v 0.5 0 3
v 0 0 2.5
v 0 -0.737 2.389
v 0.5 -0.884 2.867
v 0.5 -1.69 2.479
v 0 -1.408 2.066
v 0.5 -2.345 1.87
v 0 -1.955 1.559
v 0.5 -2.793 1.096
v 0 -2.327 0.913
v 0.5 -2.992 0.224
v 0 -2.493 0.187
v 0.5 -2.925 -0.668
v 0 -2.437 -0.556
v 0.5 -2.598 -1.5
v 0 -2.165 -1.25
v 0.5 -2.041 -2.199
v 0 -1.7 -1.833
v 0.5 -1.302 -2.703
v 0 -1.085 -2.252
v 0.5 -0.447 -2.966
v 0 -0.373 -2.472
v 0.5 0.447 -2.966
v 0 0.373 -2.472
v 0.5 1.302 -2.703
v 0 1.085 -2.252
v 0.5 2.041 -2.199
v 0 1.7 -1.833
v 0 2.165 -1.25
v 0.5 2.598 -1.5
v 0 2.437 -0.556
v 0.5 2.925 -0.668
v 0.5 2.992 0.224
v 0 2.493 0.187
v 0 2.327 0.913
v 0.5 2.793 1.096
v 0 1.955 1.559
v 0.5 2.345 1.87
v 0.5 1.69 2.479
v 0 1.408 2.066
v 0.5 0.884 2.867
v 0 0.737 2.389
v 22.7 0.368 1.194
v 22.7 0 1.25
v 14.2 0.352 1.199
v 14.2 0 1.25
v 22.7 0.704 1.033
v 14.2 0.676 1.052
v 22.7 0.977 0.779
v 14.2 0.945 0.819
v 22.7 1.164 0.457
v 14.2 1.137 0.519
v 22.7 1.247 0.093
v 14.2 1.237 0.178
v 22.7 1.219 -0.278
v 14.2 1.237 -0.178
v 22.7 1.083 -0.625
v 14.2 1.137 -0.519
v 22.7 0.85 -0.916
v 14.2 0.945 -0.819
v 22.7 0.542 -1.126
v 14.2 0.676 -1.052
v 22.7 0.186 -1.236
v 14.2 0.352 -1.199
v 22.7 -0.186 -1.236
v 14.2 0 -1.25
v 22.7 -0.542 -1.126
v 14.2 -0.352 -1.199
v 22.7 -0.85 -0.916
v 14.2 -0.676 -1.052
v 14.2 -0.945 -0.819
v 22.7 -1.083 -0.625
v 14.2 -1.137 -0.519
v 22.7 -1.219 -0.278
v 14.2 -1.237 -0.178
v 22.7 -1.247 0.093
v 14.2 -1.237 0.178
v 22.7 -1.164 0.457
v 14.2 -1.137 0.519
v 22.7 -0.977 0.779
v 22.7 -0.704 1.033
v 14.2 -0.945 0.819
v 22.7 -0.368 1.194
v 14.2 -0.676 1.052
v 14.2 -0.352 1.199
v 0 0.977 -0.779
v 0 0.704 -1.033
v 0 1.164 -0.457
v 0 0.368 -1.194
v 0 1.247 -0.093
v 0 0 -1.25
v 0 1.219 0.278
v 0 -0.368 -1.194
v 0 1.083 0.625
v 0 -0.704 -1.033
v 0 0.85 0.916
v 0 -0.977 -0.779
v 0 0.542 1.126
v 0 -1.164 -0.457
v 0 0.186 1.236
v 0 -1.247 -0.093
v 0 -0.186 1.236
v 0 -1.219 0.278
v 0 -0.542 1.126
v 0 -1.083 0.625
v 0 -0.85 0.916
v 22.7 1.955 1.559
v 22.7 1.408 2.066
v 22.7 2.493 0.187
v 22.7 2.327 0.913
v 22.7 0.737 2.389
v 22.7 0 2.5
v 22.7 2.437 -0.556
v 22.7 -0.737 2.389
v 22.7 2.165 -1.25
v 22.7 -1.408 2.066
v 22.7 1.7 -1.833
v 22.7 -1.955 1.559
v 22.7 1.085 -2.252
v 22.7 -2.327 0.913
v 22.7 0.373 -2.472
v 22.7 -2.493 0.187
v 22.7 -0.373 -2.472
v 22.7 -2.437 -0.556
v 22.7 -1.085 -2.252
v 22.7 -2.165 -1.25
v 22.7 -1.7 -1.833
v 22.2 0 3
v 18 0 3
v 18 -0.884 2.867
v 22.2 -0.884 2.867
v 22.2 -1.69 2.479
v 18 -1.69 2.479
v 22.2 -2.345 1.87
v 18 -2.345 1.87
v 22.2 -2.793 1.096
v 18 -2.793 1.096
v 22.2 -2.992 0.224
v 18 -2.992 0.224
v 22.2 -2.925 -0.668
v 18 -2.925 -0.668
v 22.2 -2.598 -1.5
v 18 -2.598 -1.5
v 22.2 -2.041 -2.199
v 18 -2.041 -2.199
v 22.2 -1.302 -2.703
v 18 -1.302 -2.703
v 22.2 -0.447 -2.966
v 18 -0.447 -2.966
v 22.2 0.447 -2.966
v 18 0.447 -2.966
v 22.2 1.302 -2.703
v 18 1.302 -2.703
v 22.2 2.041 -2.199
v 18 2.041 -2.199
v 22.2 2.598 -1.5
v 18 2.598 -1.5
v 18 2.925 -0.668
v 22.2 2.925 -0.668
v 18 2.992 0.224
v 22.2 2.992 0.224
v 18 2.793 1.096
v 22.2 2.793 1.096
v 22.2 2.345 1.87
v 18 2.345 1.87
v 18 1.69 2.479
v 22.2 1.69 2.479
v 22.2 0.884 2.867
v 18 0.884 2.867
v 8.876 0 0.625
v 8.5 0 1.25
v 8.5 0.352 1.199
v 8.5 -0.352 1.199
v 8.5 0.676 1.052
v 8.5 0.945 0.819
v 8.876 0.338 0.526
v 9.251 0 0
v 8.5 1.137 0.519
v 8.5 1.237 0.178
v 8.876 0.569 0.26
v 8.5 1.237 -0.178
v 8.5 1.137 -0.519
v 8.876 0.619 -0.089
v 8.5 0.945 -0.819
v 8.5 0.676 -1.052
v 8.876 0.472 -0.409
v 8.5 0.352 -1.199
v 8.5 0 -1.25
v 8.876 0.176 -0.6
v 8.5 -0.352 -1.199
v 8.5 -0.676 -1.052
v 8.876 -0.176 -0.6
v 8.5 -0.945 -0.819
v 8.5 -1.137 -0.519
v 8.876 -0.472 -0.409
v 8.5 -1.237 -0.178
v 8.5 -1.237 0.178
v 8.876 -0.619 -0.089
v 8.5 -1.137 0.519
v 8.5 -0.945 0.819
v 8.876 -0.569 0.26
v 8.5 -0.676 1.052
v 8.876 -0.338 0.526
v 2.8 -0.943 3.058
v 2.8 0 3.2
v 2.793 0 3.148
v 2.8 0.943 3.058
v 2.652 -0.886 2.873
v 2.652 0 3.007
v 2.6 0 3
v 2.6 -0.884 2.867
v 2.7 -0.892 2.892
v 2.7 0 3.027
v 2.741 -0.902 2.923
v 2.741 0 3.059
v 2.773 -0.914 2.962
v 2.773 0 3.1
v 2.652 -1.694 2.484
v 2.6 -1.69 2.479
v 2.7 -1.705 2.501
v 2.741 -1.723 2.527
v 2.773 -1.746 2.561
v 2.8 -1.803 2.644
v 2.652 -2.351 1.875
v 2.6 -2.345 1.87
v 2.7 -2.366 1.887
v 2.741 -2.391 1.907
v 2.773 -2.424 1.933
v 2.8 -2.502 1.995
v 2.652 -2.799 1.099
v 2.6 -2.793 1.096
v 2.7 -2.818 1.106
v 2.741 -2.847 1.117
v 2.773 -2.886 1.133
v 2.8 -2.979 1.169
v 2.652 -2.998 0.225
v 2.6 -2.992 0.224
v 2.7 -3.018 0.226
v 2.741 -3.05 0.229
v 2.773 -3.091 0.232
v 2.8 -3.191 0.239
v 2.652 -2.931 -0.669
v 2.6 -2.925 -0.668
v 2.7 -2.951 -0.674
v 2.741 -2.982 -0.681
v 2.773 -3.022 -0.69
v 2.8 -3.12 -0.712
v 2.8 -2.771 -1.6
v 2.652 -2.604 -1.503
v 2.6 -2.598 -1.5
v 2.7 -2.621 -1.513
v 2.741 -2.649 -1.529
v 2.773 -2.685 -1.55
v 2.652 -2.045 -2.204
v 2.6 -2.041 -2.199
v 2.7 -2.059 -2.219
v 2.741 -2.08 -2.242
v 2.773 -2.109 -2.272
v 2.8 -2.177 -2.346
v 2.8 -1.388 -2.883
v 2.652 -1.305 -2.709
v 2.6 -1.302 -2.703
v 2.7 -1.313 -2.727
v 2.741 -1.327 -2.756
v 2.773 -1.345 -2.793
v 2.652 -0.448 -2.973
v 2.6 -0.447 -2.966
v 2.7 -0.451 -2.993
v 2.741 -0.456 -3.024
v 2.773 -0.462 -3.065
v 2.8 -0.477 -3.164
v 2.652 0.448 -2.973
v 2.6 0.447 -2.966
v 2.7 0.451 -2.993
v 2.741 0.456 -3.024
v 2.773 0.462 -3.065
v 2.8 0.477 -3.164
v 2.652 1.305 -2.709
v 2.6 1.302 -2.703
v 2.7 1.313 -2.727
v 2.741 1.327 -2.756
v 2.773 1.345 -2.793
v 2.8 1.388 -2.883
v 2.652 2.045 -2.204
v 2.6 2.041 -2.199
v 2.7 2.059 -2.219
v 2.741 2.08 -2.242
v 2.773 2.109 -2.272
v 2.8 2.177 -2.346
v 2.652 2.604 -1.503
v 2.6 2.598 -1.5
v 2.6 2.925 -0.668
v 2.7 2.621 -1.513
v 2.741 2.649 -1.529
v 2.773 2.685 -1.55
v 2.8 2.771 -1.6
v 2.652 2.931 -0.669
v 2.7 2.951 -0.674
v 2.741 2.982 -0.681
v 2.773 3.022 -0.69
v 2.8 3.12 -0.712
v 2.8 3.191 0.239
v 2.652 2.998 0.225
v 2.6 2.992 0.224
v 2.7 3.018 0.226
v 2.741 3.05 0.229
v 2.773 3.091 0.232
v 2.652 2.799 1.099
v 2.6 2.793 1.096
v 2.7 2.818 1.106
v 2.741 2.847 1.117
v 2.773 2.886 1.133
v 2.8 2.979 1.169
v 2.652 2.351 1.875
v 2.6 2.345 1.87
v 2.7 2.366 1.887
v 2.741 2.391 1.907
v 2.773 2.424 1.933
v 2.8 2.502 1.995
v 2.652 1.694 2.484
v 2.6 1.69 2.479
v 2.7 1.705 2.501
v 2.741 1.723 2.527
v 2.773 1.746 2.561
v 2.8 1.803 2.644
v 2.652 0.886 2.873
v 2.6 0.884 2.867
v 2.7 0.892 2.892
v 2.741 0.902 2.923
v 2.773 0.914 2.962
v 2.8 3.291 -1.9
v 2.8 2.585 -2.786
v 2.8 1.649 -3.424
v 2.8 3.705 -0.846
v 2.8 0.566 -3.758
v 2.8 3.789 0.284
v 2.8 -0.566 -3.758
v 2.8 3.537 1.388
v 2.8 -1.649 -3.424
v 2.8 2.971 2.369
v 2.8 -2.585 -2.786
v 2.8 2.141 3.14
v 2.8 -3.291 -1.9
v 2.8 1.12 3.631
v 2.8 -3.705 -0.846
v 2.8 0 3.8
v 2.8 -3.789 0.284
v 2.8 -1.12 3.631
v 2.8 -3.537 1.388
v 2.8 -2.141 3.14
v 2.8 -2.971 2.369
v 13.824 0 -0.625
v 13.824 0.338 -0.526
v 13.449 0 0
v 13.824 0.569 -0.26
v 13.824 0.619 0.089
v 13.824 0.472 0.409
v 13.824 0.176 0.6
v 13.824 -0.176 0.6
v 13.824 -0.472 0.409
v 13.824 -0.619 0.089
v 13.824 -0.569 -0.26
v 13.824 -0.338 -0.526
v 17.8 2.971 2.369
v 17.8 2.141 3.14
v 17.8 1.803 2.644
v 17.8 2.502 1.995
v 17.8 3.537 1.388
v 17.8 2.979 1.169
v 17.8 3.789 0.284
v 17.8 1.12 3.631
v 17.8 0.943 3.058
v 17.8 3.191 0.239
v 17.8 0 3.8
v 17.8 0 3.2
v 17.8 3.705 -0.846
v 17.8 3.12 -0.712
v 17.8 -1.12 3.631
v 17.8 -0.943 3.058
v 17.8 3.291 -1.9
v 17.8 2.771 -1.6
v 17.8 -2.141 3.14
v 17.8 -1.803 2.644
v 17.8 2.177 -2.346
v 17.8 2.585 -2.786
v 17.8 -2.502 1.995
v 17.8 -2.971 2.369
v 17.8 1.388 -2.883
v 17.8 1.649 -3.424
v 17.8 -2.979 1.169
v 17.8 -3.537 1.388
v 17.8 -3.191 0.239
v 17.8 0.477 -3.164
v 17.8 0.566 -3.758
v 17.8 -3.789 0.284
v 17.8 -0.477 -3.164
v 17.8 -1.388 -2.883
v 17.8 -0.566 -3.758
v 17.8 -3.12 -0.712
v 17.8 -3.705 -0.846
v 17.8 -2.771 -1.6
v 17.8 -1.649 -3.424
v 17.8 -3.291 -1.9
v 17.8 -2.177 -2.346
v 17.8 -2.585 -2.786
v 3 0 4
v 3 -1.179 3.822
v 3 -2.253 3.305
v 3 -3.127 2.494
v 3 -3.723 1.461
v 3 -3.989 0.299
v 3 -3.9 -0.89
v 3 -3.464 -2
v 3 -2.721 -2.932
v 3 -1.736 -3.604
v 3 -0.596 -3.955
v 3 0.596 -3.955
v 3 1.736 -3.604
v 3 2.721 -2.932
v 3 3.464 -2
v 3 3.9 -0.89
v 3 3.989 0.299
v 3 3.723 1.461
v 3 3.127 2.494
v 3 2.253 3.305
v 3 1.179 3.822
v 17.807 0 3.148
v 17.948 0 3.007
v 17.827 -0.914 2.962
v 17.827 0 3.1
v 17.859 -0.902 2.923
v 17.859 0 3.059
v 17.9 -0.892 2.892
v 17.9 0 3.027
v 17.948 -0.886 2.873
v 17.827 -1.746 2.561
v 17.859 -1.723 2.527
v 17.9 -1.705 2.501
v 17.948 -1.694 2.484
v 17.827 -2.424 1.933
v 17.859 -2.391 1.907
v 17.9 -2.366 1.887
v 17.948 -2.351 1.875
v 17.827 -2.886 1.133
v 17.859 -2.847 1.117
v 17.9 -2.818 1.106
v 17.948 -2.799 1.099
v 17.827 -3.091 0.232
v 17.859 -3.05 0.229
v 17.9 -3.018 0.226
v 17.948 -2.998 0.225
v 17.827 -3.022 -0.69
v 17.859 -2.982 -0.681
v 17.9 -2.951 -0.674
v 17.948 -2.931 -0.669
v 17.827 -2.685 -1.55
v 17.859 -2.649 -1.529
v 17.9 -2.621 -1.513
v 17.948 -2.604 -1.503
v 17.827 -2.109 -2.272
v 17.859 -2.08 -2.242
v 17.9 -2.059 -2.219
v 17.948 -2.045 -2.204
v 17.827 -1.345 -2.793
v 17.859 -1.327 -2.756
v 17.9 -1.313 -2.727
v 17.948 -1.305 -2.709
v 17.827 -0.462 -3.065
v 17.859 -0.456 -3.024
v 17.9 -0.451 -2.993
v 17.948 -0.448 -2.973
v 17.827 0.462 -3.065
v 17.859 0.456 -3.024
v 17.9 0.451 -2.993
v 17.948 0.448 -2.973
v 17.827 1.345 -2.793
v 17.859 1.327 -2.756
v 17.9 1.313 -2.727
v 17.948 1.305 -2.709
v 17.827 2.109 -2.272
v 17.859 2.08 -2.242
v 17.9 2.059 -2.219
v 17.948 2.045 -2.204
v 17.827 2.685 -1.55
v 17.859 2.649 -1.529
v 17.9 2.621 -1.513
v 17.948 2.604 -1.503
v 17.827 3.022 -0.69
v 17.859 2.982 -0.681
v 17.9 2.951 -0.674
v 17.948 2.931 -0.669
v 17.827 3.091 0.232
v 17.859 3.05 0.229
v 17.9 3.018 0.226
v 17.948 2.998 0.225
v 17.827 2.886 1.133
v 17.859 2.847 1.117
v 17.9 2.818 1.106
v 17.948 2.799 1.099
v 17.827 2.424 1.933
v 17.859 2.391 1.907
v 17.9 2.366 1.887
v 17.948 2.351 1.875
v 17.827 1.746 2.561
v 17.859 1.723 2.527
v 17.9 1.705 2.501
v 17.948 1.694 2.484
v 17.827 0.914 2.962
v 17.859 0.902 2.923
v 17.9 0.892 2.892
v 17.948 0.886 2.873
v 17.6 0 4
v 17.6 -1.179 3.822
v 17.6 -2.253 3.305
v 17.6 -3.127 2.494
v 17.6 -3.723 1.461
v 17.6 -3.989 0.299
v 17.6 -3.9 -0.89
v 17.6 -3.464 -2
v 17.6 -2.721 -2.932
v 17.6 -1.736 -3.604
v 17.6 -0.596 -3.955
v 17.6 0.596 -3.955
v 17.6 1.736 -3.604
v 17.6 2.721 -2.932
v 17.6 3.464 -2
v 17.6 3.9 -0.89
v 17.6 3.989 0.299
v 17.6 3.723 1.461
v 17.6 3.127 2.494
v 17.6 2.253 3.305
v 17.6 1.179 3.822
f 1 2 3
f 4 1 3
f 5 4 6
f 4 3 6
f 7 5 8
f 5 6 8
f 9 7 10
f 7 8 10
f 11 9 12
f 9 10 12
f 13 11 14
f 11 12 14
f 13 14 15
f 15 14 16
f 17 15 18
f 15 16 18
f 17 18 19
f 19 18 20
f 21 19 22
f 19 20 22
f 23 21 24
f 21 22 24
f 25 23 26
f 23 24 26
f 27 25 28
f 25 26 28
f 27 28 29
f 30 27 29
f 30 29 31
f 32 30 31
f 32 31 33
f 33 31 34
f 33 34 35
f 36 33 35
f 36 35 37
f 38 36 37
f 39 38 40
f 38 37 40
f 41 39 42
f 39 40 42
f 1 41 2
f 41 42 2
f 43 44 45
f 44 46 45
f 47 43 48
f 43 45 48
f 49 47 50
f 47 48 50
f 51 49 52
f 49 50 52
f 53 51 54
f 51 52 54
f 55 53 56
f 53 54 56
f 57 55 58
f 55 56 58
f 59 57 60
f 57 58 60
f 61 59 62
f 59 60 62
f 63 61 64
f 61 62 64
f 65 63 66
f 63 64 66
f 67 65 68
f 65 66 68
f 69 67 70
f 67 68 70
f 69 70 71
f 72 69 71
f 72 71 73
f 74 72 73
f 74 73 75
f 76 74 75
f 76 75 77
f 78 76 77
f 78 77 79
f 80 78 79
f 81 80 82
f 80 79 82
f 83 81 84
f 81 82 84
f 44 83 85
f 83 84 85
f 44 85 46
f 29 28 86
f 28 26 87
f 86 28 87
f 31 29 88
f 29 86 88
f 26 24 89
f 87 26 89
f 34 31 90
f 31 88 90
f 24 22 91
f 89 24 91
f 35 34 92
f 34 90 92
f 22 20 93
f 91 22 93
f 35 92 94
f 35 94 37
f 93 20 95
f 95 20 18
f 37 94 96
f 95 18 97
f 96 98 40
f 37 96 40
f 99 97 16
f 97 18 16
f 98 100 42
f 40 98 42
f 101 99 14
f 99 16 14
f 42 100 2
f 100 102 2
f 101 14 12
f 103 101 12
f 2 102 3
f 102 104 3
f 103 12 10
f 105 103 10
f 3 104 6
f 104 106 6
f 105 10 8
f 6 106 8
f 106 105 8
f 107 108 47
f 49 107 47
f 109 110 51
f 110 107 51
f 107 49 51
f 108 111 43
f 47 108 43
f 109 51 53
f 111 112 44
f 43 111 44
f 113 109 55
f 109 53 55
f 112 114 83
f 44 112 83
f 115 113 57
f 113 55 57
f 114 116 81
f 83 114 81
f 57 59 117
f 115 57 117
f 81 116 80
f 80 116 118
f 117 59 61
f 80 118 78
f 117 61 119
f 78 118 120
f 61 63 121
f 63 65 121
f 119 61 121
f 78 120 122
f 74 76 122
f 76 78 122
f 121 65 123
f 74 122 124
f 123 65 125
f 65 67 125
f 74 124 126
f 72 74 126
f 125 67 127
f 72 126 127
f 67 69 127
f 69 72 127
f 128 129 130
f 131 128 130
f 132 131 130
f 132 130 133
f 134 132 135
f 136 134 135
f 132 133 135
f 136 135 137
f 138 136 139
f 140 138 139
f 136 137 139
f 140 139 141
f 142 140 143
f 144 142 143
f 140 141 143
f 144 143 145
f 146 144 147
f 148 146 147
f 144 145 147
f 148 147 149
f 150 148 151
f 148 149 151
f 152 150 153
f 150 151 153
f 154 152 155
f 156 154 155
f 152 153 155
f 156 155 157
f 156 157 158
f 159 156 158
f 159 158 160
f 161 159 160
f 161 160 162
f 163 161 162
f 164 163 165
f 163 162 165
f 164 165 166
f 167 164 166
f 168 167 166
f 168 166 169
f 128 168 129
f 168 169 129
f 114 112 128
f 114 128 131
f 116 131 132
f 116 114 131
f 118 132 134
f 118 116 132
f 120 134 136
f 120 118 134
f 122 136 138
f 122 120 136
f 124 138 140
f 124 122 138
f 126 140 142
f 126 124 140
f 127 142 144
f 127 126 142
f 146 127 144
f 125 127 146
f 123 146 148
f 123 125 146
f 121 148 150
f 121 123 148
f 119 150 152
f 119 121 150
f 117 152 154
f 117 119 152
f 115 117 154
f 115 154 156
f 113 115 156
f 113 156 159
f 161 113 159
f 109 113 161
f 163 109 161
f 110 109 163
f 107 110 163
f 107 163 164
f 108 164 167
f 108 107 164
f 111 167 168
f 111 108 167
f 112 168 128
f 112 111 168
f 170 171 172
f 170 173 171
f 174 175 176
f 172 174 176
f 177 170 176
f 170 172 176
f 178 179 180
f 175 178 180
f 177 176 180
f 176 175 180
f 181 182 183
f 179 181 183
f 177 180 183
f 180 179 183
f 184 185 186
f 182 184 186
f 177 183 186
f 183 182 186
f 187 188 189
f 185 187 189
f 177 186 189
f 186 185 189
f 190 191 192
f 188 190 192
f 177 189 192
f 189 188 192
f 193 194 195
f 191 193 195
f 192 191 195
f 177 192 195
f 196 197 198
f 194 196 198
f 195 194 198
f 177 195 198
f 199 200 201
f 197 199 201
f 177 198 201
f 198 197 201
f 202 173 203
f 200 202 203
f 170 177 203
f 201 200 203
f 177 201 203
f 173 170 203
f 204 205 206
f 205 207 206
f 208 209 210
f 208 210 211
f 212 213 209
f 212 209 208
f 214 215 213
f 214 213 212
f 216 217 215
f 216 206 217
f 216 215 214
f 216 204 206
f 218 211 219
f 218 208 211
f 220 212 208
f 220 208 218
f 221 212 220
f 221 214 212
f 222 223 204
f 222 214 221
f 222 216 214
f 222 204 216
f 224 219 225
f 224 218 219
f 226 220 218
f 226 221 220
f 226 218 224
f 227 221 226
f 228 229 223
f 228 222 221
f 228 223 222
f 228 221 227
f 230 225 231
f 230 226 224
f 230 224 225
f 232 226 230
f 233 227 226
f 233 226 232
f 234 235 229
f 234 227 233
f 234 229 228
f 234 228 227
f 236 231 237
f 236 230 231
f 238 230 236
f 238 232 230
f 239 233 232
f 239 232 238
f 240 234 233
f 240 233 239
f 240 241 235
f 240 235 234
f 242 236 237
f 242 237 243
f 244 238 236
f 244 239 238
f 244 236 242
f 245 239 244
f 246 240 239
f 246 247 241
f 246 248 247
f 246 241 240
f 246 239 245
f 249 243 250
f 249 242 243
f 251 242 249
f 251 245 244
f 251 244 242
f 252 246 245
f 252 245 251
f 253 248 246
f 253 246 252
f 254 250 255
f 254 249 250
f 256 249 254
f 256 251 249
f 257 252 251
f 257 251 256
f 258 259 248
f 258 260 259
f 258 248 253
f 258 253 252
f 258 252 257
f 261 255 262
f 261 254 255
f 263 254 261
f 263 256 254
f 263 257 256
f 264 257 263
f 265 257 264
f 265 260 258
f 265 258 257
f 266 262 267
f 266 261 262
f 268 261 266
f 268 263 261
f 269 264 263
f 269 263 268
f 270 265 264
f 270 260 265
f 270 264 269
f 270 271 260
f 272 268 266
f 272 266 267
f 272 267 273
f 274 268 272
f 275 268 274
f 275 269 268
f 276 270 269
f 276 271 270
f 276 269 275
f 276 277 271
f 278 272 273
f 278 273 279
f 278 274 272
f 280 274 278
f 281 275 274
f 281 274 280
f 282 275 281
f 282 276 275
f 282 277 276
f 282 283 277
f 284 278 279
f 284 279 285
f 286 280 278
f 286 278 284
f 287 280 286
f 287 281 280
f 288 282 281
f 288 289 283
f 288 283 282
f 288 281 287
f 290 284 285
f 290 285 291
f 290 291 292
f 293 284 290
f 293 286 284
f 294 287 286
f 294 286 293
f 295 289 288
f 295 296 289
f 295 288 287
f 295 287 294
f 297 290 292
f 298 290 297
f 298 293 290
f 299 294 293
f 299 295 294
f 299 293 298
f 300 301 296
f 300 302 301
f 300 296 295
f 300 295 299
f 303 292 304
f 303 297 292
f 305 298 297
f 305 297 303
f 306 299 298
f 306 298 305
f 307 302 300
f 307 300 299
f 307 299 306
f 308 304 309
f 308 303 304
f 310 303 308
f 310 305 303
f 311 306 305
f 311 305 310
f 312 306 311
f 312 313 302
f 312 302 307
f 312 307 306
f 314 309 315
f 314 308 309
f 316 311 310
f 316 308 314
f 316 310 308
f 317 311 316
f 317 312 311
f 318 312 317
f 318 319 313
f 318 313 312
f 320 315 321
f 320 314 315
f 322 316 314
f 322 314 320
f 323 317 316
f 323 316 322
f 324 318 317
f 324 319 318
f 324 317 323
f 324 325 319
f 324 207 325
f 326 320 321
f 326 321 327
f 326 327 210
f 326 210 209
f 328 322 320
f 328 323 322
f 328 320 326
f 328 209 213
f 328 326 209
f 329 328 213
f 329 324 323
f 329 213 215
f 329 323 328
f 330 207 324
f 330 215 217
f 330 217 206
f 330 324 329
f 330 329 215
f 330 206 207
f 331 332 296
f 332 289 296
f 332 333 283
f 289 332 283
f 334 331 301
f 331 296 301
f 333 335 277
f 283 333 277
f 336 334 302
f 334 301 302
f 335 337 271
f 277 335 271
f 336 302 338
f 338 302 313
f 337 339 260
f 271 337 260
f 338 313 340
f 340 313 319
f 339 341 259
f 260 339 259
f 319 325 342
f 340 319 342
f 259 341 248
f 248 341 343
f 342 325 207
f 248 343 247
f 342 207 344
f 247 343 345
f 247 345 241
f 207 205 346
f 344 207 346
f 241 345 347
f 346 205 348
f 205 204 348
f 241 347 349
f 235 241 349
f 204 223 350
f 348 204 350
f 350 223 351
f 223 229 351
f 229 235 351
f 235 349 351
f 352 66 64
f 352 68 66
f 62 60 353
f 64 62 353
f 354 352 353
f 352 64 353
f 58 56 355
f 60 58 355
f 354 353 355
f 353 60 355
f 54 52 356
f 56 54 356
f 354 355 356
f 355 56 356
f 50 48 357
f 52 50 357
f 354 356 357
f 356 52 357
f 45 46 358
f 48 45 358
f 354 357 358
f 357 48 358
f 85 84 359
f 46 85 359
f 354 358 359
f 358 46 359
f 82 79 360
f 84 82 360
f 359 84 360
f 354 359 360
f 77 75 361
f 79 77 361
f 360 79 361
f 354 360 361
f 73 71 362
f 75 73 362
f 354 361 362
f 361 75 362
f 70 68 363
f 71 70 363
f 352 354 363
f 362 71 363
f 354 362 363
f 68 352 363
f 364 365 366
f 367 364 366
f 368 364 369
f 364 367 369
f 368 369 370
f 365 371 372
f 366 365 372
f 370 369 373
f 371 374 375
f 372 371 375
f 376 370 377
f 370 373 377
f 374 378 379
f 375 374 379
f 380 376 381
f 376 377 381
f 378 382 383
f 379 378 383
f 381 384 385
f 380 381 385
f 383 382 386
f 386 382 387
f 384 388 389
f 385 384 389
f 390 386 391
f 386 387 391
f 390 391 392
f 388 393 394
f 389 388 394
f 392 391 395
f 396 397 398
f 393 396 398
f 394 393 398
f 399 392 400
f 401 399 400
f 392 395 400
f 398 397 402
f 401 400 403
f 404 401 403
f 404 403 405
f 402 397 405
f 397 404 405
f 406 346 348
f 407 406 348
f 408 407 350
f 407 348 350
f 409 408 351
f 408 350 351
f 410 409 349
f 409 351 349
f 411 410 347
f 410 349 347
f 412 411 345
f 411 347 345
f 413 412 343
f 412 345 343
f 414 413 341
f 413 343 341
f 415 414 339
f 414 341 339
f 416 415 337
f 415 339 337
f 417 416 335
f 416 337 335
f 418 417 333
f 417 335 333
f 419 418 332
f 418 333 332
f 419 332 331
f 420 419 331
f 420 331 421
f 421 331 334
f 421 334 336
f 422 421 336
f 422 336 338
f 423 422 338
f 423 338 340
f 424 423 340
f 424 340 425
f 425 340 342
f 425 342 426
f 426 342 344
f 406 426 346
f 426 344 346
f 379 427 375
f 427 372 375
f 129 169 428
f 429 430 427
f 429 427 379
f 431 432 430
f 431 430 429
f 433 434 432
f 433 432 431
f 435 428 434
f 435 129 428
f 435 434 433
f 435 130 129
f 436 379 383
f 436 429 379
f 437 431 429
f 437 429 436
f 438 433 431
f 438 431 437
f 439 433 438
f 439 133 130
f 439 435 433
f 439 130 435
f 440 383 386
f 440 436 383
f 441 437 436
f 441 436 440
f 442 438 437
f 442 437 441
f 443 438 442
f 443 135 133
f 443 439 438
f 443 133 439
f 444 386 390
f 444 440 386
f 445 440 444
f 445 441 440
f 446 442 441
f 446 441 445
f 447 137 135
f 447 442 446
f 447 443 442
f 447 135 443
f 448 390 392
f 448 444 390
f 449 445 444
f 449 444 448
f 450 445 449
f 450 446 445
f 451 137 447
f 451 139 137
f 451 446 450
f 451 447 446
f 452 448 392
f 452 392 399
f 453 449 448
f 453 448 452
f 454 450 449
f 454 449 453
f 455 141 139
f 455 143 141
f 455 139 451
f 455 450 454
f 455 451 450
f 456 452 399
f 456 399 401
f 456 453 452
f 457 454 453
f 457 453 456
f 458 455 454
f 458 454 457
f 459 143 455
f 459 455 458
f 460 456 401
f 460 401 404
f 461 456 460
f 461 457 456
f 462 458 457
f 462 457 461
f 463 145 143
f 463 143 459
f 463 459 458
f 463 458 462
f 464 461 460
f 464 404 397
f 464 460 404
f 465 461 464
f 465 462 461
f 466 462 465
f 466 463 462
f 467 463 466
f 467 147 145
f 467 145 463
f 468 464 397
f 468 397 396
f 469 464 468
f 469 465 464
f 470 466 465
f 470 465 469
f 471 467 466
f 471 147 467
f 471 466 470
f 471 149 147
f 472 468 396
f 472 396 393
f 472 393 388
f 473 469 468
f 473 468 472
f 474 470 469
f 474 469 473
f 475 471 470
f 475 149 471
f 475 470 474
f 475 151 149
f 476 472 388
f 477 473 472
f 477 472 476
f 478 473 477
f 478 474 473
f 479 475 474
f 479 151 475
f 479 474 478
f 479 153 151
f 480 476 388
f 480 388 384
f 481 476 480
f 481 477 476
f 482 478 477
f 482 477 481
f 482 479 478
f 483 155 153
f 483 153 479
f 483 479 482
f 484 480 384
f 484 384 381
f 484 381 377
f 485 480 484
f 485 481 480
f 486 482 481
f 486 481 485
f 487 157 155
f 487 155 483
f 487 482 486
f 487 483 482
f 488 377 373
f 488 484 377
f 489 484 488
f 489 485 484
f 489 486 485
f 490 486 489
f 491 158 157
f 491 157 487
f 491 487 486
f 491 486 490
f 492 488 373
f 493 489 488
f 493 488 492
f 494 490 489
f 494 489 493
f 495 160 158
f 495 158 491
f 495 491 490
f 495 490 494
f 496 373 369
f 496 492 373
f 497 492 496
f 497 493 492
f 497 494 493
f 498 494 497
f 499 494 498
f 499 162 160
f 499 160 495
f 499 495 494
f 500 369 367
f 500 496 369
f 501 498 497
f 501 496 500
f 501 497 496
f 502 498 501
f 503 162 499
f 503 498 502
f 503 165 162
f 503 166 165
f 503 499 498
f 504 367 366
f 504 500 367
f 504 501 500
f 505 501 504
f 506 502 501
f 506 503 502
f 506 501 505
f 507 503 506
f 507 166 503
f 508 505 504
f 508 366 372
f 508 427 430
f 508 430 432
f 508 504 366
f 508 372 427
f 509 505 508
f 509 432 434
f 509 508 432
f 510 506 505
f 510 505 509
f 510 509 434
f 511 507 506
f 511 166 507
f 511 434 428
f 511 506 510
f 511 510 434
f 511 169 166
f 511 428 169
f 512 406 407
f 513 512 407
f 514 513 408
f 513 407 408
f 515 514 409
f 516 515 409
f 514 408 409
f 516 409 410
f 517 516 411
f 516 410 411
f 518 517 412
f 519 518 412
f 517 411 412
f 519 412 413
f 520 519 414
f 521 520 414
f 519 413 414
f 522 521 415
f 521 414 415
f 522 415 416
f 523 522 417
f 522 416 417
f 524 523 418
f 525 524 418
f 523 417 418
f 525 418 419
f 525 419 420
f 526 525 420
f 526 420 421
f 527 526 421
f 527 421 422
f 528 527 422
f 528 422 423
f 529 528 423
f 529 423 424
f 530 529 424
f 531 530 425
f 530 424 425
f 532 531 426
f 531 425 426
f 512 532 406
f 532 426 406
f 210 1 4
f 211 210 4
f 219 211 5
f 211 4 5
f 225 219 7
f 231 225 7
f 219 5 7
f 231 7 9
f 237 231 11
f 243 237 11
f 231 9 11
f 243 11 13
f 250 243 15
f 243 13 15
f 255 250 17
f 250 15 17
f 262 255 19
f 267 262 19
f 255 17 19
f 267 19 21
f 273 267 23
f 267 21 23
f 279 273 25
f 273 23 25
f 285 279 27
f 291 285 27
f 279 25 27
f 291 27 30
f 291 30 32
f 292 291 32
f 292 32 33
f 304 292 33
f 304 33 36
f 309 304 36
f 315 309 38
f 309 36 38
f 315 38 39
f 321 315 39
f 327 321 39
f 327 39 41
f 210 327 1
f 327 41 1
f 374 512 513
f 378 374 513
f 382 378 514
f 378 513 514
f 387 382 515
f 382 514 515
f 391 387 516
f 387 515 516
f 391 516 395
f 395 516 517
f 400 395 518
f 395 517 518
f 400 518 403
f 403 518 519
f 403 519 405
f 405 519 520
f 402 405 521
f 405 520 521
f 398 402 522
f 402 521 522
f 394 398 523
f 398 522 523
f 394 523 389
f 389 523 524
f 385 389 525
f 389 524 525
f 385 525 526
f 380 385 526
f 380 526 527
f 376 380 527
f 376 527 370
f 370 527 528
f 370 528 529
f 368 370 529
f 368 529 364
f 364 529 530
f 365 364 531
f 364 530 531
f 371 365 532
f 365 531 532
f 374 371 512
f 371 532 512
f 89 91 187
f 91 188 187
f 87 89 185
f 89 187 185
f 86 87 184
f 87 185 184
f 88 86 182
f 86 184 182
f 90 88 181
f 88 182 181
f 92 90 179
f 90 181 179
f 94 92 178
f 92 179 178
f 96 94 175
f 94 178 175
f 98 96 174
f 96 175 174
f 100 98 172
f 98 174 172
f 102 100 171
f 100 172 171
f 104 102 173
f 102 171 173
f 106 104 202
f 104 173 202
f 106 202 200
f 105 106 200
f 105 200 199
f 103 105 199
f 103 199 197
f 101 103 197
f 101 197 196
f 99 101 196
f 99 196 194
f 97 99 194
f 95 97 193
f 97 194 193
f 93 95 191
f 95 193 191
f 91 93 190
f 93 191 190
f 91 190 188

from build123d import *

# Parameters (mm, degrees)
TAPPED_HOLE1_D     = 2.5
TAPPED_HOLE1_DEPTH = 8.5
TAPPED_HOLE1_TIP   = 0.751075774
TAPPED_HOLE2_D     = 2.5
TAPPED_HOLE2_DEPTH = 8.5
TAPPED_HOLE2_TIP   = 0.751075774
CHAMFER1_SIZE      = 0.2
CHAMFER2_SIZE      = 0.2
CHAMFER3_SIZE      = 0.5
FILLET1_R          = 0.2
FILLET2_R          = 0.2


with BuildPart() as part:
    # Sketch1 → Revolve1 (revolve)
    with BuildSketch(Plane.XY):
        Polygon((0, 0), (22.7, 0), (22.7, 3), (17.8, 3), (17.8, 4), (2.8, 4), (2.8, 3), (0, 3), align=None)
    revolve(axis=Axis((0, 0, 0), (1, 0, 0)))

    # Tapped Hole1
    with Locations(Plane.ZY):
        with Locations((0, 0)):
            Hole(TAPPED_HOLE1_D / 2, depth=TAPPED_HOLE1_DEPTH)
            with Locations((0, 0, -(TAPPED_HOLE1_DEPTH + TAPPED_HOLE1_TIP / 2))):  # 118° drill point
                Cone(0, TAPPED_HOLE1_D / 2, TAPPED_HOLE1_TIP, mode=Mode.SUBTRACT)

    # Tapped Hole2
    with Locations(Plane(origin=(22.7, 0, 0), x_dir=(0, 0, -1), z_dir=(1, 0, 0))):
        with Locations((0, 0)):
            Hole(TAPPED_HOLE2_D / 2, depth=TAPPED_HOLE2_DEPTH)
            with Locations((0, 0, -(TAPPED_HOLE2_DEPTH + TAPPED_HOLE2_TIP / 2))):  # 118° drill point
                Cone(0, TAPPED_HOLE2_D / 2, TAPPED_HOLE2_TIP, mode=Mode.SUBTRACT)

    # Chamfer1
    chamfer1_edges = [part.edges().sort_by_distance(p)[0] for p in [
        (17.8, -4, 0),
    ]]
    chamfer(chamfer1_edges, length=CHAMFER1_SIZE)

    # Chamfer2
    chamfer2_edges = [part.edges().sort_by_distance(p)[0] for p in [
        (2.8, -4, 0),
    ]]
    chamfer(chamfer2_edges, length=CHAMFER2_SIZE)

    # Chamfer3
    chamfer3_edges = [part.edges().sort_by_distance(p)[0] for p in [
        (22.7, -3, 0),
        (0, -3, 0),
    ]]
    chamfer(chamfer3_edges, length=CHAMFER3_SIZE)

    # Fillet1
    fillet1_edges = [part.edges().sort_by_distance(p)[0] for p in [
        (2.8, -3, 0),
    ]]
    fillet(fillet1_edges, radius=FILLET1_R)

    # Fillet2
    fillet2_edges = [part.edges().sort_by_distance(p)[0] for p in [
        (17.8, -3, 0),
    ]]
    fillet(fillet2_edges, radius=FILLET2_R)


solid = part.part
